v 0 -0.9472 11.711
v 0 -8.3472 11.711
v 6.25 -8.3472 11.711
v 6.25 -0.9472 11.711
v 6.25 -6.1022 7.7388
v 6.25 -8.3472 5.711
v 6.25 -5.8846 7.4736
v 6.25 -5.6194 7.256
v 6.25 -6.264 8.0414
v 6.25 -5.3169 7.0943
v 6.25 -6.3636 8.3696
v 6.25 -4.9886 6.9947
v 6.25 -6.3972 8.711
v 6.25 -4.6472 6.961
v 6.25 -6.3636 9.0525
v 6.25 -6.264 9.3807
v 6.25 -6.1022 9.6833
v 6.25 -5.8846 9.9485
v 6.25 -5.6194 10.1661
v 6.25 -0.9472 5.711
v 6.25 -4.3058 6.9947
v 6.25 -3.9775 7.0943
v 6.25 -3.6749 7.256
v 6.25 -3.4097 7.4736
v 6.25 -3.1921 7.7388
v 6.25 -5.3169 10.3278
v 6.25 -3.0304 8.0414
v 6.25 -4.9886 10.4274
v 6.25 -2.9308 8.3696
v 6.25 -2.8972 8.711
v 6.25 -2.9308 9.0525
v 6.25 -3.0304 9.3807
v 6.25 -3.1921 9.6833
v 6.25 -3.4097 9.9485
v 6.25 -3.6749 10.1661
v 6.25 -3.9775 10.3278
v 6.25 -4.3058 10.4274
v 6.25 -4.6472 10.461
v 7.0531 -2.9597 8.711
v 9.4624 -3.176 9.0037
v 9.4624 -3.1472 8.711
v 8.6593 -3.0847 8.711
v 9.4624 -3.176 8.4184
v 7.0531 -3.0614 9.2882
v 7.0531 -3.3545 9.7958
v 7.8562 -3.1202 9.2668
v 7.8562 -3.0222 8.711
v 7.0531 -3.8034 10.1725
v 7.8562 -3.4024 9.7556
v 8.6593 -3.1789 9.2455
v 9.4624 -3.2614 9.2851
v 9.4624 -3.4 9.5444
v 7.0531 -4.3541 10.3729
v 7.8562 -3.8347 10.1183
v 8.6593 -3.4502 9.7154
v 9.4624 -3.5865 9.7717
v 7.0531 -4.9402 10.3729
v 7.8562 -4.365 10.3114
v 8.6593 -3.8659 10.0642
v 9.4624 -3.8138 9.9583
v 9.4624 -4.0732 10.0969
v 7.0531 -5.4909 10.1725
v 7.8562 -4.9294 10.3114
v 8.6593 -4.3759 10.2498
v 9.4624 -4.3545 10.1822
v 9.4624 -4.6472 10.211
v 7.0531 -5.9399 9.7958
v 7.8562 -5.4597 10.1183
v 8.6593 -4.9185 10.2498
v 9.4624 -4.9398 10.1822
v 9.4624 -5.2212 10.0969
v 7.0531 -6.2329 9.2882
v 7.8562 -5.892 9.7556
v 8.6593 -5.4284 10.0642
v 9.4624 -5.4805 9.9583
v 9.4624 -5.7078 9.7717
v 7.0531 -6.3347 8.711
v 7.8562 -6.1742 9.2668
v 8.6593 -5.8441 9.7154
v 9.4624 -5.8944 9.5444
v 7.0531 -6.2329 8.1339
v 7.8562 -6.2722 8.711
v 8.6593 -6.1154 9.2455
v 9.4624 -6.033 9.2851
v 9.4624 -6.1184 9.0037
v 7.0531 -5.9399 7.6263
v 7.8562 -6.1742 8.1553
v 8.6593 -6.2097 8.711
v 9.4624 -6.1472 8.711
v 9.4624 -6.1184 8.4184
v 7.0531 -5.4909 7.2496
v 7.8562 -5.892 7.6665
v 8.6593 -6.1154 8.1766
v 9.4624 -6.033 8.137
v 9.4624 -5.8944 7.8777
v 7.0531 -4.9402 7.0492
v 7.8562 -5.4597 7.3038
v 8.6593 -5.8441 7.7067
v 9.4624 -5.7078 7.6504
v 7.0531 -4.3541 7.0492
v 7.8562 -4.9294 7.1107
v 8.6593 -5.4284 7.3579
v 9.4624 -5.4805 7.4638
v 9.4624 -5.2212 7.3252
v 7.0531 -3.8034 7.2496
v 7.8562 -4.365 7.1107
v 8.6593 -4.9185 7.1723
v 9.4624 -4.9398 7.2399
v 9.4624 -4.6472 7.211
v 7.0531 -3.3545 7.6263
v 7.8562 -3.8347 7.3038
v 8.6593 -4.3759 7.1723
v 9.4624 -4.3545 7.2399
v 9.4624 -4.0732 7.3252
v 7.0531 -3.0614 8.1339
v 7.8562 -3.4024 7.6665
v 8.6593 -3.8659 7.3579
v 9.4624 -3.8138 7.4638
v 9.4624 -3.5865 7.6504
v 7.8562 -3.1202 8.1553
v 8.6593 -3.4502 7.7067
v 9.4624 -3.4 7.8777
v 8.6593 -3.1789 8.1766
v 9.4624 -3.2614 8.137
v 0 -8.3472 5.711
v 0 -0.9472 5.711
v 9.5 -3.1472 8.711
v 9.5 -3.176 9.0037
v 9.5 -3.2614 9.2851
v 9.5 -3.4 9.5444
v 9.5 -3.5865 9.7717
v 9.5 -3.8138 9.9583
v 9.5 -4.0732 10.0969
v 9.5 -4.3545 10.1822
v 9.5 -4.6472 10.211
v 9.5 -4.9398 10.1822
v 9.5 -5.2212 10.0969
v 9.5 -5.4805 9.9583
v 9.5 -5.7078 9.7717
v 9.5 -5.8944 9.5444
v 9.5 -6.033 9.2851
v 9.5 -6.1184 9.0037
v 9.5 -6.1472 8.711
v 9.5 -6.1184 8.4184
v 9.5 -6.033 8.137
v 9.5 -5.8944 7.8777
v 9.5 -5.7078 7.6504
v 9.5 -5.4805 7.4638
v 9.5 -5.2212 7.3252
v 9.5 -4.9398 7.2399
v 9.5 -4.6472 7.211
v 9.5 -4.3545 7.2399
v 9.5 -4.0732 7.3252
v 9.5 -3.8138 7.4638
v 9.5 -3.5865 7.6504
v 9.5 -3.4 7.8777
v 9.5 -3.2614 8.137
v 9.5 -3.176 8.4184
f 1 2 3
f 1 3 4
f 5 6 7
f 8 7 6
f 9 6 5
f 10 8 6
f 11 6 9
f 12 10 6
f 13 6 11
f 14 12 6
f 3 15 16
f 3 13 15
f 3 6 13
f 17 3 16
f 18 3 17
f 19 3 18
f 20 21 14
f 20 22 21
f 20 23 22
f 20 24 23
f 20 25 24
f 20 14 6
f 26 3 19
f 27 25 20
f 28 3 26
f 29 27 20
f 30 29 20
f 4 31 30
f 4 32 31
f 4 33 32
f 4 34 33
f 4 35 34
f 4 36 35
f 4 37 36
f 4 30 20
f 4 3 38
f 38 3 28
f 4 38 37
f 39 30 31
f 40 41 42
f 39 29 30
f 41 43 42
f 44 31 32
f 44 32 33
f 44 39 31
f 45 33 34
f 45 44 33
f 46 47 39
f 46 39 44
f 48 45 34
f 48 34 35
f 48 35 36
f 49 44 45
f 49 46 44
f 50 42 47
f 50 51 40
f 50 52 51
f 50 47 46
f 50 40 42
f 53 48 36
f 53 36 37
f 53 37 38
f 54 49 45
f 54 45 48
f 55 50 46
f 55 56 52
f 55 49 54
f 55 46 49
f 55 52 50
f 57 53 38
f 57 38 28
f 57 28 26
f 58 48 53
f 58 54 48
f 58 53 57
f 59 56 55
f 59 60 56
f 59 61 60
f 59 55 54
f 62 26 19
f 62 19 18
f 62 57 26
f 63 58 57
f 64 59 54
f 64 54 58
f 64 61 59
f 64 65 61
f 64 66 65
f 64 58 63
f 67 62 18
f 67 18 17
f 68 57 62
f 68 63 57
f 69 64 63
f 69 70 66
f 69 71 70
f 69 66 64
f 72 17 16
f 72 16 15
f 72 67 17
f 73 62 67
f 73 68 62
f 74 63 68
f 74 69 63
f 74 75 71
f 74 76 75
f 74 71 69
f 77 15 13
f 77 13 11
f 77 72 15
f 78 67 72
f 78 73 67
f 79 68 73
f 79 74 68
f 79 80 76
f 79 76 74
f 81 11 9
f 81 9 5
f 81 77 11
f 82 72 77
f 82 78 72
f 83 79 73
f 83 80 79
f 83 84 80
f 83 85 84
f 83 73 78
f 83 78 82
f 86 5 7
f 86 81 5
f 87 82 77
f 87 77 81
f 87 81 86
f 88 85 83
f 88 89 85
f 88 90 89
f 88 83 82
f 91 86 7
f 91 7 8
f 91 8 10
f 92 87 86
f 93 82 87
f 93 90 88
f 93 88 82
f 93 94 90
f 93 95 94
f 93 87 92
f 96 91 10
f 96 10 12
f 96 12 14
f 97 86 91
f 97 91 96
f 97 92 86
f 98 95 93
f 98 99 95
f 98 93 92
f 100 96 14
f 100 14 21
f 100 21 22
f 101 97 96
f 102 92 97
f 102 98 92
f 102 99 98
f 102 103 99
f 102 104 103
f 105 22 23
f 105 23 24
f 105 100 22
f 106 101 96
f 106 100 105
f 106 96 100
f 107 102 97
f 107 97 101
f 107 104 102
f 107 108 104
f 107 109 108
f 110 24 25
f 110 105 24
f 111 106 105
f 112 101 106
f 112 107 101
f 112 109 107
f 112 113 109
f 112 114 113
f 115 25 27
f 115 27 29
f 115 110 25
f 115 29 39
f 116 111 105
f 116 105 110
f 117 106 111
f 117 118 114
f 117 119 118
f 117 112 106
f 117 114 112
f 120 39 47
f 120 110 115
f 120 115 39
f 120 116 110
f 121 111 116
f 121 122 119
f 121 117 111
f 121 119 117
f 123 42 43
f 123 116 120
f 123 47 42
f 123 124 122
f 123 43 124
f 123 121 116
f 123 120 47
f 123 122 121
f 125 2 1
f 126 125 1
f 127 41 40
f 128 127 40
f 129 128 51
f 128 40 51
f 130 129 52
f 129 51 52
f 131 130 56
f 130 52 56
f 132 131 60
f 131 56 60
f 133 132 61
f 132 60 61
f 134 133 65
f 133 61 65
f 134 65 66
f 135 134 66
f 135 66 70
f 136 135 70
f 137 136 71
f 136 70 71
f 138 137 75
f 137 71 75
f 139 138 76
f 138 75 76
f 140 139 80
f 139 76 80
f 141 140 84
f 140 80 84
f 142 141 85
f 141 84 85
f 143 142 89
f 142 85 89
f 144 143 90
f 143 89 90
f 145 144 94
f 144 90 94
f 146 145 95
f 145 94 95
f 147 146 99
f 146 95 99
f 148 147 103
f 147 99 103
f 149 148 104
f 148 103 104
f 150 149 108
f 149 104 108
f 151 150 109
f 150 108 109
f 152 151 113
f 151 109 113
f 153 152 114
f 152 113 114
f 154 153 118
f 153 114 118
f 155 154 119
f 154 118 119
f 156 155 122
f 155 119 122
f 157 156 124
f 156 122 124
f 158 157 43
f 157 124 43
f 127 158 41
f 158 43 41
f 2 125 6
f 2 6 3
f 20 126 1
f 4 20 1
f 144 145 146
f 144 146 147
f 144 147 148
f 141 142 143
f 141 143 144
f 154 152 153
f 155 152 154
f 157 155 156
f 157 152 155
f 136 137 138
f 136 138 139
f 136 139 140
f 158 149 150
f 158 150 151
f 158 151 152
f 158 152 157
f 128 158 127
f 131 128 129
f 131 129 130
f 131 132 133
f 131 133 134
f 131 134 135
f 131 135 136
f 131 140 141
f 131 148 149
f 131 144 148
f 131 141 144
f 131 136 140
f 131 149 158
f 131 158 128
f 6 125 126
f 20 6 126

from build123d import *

# Parameters (mm, degrees)
SKETCH003_W   = 7.4
SKETCH003_H   = 6
PAD003_DEPTH  = 6.25
SKETCH004_R   = 1.5
PAD004_DEPTH  = 3.25
CHAMFER_ANGLE = 85.55
CHAMFER_SIZE  = 0.25


with BuildPart() as part:
    # Sketch003 → Pad003 (new body)
    with BuildSketch(Plane.YZ):
        with Locations((-4.647178, 8.71105)):
            Rectangle(SKETCH003_W, SKETCH003_H)
    extrude(amount=PAD003_DEPTH)

    # Sketch004 (on Face6 of Pad003) → Pad004 (join)
    with BuildSketch(Plane.YZ.offset(6.25)):
        with Locations((-4.647178, 8.71105)):
            Circle(SKETCH004_R)
    extrude(amount=PAD004_DEPTH)

    # Chamfer
    chamfer_edges = [part.edges().sort_by_distance(p)[0] for p in [
        (6.25, -6.147178, 8.71105),
    ]]
    chamfer_side = part.faces().sort_by_distance((6.25, -8.25191, 8.71105))[0]
    chamfer(chamfer_edges, length=CHAMFER_SIZE, angle=CHAMFER_ANGLE, reference=chamfer_side)


solid = part.part
